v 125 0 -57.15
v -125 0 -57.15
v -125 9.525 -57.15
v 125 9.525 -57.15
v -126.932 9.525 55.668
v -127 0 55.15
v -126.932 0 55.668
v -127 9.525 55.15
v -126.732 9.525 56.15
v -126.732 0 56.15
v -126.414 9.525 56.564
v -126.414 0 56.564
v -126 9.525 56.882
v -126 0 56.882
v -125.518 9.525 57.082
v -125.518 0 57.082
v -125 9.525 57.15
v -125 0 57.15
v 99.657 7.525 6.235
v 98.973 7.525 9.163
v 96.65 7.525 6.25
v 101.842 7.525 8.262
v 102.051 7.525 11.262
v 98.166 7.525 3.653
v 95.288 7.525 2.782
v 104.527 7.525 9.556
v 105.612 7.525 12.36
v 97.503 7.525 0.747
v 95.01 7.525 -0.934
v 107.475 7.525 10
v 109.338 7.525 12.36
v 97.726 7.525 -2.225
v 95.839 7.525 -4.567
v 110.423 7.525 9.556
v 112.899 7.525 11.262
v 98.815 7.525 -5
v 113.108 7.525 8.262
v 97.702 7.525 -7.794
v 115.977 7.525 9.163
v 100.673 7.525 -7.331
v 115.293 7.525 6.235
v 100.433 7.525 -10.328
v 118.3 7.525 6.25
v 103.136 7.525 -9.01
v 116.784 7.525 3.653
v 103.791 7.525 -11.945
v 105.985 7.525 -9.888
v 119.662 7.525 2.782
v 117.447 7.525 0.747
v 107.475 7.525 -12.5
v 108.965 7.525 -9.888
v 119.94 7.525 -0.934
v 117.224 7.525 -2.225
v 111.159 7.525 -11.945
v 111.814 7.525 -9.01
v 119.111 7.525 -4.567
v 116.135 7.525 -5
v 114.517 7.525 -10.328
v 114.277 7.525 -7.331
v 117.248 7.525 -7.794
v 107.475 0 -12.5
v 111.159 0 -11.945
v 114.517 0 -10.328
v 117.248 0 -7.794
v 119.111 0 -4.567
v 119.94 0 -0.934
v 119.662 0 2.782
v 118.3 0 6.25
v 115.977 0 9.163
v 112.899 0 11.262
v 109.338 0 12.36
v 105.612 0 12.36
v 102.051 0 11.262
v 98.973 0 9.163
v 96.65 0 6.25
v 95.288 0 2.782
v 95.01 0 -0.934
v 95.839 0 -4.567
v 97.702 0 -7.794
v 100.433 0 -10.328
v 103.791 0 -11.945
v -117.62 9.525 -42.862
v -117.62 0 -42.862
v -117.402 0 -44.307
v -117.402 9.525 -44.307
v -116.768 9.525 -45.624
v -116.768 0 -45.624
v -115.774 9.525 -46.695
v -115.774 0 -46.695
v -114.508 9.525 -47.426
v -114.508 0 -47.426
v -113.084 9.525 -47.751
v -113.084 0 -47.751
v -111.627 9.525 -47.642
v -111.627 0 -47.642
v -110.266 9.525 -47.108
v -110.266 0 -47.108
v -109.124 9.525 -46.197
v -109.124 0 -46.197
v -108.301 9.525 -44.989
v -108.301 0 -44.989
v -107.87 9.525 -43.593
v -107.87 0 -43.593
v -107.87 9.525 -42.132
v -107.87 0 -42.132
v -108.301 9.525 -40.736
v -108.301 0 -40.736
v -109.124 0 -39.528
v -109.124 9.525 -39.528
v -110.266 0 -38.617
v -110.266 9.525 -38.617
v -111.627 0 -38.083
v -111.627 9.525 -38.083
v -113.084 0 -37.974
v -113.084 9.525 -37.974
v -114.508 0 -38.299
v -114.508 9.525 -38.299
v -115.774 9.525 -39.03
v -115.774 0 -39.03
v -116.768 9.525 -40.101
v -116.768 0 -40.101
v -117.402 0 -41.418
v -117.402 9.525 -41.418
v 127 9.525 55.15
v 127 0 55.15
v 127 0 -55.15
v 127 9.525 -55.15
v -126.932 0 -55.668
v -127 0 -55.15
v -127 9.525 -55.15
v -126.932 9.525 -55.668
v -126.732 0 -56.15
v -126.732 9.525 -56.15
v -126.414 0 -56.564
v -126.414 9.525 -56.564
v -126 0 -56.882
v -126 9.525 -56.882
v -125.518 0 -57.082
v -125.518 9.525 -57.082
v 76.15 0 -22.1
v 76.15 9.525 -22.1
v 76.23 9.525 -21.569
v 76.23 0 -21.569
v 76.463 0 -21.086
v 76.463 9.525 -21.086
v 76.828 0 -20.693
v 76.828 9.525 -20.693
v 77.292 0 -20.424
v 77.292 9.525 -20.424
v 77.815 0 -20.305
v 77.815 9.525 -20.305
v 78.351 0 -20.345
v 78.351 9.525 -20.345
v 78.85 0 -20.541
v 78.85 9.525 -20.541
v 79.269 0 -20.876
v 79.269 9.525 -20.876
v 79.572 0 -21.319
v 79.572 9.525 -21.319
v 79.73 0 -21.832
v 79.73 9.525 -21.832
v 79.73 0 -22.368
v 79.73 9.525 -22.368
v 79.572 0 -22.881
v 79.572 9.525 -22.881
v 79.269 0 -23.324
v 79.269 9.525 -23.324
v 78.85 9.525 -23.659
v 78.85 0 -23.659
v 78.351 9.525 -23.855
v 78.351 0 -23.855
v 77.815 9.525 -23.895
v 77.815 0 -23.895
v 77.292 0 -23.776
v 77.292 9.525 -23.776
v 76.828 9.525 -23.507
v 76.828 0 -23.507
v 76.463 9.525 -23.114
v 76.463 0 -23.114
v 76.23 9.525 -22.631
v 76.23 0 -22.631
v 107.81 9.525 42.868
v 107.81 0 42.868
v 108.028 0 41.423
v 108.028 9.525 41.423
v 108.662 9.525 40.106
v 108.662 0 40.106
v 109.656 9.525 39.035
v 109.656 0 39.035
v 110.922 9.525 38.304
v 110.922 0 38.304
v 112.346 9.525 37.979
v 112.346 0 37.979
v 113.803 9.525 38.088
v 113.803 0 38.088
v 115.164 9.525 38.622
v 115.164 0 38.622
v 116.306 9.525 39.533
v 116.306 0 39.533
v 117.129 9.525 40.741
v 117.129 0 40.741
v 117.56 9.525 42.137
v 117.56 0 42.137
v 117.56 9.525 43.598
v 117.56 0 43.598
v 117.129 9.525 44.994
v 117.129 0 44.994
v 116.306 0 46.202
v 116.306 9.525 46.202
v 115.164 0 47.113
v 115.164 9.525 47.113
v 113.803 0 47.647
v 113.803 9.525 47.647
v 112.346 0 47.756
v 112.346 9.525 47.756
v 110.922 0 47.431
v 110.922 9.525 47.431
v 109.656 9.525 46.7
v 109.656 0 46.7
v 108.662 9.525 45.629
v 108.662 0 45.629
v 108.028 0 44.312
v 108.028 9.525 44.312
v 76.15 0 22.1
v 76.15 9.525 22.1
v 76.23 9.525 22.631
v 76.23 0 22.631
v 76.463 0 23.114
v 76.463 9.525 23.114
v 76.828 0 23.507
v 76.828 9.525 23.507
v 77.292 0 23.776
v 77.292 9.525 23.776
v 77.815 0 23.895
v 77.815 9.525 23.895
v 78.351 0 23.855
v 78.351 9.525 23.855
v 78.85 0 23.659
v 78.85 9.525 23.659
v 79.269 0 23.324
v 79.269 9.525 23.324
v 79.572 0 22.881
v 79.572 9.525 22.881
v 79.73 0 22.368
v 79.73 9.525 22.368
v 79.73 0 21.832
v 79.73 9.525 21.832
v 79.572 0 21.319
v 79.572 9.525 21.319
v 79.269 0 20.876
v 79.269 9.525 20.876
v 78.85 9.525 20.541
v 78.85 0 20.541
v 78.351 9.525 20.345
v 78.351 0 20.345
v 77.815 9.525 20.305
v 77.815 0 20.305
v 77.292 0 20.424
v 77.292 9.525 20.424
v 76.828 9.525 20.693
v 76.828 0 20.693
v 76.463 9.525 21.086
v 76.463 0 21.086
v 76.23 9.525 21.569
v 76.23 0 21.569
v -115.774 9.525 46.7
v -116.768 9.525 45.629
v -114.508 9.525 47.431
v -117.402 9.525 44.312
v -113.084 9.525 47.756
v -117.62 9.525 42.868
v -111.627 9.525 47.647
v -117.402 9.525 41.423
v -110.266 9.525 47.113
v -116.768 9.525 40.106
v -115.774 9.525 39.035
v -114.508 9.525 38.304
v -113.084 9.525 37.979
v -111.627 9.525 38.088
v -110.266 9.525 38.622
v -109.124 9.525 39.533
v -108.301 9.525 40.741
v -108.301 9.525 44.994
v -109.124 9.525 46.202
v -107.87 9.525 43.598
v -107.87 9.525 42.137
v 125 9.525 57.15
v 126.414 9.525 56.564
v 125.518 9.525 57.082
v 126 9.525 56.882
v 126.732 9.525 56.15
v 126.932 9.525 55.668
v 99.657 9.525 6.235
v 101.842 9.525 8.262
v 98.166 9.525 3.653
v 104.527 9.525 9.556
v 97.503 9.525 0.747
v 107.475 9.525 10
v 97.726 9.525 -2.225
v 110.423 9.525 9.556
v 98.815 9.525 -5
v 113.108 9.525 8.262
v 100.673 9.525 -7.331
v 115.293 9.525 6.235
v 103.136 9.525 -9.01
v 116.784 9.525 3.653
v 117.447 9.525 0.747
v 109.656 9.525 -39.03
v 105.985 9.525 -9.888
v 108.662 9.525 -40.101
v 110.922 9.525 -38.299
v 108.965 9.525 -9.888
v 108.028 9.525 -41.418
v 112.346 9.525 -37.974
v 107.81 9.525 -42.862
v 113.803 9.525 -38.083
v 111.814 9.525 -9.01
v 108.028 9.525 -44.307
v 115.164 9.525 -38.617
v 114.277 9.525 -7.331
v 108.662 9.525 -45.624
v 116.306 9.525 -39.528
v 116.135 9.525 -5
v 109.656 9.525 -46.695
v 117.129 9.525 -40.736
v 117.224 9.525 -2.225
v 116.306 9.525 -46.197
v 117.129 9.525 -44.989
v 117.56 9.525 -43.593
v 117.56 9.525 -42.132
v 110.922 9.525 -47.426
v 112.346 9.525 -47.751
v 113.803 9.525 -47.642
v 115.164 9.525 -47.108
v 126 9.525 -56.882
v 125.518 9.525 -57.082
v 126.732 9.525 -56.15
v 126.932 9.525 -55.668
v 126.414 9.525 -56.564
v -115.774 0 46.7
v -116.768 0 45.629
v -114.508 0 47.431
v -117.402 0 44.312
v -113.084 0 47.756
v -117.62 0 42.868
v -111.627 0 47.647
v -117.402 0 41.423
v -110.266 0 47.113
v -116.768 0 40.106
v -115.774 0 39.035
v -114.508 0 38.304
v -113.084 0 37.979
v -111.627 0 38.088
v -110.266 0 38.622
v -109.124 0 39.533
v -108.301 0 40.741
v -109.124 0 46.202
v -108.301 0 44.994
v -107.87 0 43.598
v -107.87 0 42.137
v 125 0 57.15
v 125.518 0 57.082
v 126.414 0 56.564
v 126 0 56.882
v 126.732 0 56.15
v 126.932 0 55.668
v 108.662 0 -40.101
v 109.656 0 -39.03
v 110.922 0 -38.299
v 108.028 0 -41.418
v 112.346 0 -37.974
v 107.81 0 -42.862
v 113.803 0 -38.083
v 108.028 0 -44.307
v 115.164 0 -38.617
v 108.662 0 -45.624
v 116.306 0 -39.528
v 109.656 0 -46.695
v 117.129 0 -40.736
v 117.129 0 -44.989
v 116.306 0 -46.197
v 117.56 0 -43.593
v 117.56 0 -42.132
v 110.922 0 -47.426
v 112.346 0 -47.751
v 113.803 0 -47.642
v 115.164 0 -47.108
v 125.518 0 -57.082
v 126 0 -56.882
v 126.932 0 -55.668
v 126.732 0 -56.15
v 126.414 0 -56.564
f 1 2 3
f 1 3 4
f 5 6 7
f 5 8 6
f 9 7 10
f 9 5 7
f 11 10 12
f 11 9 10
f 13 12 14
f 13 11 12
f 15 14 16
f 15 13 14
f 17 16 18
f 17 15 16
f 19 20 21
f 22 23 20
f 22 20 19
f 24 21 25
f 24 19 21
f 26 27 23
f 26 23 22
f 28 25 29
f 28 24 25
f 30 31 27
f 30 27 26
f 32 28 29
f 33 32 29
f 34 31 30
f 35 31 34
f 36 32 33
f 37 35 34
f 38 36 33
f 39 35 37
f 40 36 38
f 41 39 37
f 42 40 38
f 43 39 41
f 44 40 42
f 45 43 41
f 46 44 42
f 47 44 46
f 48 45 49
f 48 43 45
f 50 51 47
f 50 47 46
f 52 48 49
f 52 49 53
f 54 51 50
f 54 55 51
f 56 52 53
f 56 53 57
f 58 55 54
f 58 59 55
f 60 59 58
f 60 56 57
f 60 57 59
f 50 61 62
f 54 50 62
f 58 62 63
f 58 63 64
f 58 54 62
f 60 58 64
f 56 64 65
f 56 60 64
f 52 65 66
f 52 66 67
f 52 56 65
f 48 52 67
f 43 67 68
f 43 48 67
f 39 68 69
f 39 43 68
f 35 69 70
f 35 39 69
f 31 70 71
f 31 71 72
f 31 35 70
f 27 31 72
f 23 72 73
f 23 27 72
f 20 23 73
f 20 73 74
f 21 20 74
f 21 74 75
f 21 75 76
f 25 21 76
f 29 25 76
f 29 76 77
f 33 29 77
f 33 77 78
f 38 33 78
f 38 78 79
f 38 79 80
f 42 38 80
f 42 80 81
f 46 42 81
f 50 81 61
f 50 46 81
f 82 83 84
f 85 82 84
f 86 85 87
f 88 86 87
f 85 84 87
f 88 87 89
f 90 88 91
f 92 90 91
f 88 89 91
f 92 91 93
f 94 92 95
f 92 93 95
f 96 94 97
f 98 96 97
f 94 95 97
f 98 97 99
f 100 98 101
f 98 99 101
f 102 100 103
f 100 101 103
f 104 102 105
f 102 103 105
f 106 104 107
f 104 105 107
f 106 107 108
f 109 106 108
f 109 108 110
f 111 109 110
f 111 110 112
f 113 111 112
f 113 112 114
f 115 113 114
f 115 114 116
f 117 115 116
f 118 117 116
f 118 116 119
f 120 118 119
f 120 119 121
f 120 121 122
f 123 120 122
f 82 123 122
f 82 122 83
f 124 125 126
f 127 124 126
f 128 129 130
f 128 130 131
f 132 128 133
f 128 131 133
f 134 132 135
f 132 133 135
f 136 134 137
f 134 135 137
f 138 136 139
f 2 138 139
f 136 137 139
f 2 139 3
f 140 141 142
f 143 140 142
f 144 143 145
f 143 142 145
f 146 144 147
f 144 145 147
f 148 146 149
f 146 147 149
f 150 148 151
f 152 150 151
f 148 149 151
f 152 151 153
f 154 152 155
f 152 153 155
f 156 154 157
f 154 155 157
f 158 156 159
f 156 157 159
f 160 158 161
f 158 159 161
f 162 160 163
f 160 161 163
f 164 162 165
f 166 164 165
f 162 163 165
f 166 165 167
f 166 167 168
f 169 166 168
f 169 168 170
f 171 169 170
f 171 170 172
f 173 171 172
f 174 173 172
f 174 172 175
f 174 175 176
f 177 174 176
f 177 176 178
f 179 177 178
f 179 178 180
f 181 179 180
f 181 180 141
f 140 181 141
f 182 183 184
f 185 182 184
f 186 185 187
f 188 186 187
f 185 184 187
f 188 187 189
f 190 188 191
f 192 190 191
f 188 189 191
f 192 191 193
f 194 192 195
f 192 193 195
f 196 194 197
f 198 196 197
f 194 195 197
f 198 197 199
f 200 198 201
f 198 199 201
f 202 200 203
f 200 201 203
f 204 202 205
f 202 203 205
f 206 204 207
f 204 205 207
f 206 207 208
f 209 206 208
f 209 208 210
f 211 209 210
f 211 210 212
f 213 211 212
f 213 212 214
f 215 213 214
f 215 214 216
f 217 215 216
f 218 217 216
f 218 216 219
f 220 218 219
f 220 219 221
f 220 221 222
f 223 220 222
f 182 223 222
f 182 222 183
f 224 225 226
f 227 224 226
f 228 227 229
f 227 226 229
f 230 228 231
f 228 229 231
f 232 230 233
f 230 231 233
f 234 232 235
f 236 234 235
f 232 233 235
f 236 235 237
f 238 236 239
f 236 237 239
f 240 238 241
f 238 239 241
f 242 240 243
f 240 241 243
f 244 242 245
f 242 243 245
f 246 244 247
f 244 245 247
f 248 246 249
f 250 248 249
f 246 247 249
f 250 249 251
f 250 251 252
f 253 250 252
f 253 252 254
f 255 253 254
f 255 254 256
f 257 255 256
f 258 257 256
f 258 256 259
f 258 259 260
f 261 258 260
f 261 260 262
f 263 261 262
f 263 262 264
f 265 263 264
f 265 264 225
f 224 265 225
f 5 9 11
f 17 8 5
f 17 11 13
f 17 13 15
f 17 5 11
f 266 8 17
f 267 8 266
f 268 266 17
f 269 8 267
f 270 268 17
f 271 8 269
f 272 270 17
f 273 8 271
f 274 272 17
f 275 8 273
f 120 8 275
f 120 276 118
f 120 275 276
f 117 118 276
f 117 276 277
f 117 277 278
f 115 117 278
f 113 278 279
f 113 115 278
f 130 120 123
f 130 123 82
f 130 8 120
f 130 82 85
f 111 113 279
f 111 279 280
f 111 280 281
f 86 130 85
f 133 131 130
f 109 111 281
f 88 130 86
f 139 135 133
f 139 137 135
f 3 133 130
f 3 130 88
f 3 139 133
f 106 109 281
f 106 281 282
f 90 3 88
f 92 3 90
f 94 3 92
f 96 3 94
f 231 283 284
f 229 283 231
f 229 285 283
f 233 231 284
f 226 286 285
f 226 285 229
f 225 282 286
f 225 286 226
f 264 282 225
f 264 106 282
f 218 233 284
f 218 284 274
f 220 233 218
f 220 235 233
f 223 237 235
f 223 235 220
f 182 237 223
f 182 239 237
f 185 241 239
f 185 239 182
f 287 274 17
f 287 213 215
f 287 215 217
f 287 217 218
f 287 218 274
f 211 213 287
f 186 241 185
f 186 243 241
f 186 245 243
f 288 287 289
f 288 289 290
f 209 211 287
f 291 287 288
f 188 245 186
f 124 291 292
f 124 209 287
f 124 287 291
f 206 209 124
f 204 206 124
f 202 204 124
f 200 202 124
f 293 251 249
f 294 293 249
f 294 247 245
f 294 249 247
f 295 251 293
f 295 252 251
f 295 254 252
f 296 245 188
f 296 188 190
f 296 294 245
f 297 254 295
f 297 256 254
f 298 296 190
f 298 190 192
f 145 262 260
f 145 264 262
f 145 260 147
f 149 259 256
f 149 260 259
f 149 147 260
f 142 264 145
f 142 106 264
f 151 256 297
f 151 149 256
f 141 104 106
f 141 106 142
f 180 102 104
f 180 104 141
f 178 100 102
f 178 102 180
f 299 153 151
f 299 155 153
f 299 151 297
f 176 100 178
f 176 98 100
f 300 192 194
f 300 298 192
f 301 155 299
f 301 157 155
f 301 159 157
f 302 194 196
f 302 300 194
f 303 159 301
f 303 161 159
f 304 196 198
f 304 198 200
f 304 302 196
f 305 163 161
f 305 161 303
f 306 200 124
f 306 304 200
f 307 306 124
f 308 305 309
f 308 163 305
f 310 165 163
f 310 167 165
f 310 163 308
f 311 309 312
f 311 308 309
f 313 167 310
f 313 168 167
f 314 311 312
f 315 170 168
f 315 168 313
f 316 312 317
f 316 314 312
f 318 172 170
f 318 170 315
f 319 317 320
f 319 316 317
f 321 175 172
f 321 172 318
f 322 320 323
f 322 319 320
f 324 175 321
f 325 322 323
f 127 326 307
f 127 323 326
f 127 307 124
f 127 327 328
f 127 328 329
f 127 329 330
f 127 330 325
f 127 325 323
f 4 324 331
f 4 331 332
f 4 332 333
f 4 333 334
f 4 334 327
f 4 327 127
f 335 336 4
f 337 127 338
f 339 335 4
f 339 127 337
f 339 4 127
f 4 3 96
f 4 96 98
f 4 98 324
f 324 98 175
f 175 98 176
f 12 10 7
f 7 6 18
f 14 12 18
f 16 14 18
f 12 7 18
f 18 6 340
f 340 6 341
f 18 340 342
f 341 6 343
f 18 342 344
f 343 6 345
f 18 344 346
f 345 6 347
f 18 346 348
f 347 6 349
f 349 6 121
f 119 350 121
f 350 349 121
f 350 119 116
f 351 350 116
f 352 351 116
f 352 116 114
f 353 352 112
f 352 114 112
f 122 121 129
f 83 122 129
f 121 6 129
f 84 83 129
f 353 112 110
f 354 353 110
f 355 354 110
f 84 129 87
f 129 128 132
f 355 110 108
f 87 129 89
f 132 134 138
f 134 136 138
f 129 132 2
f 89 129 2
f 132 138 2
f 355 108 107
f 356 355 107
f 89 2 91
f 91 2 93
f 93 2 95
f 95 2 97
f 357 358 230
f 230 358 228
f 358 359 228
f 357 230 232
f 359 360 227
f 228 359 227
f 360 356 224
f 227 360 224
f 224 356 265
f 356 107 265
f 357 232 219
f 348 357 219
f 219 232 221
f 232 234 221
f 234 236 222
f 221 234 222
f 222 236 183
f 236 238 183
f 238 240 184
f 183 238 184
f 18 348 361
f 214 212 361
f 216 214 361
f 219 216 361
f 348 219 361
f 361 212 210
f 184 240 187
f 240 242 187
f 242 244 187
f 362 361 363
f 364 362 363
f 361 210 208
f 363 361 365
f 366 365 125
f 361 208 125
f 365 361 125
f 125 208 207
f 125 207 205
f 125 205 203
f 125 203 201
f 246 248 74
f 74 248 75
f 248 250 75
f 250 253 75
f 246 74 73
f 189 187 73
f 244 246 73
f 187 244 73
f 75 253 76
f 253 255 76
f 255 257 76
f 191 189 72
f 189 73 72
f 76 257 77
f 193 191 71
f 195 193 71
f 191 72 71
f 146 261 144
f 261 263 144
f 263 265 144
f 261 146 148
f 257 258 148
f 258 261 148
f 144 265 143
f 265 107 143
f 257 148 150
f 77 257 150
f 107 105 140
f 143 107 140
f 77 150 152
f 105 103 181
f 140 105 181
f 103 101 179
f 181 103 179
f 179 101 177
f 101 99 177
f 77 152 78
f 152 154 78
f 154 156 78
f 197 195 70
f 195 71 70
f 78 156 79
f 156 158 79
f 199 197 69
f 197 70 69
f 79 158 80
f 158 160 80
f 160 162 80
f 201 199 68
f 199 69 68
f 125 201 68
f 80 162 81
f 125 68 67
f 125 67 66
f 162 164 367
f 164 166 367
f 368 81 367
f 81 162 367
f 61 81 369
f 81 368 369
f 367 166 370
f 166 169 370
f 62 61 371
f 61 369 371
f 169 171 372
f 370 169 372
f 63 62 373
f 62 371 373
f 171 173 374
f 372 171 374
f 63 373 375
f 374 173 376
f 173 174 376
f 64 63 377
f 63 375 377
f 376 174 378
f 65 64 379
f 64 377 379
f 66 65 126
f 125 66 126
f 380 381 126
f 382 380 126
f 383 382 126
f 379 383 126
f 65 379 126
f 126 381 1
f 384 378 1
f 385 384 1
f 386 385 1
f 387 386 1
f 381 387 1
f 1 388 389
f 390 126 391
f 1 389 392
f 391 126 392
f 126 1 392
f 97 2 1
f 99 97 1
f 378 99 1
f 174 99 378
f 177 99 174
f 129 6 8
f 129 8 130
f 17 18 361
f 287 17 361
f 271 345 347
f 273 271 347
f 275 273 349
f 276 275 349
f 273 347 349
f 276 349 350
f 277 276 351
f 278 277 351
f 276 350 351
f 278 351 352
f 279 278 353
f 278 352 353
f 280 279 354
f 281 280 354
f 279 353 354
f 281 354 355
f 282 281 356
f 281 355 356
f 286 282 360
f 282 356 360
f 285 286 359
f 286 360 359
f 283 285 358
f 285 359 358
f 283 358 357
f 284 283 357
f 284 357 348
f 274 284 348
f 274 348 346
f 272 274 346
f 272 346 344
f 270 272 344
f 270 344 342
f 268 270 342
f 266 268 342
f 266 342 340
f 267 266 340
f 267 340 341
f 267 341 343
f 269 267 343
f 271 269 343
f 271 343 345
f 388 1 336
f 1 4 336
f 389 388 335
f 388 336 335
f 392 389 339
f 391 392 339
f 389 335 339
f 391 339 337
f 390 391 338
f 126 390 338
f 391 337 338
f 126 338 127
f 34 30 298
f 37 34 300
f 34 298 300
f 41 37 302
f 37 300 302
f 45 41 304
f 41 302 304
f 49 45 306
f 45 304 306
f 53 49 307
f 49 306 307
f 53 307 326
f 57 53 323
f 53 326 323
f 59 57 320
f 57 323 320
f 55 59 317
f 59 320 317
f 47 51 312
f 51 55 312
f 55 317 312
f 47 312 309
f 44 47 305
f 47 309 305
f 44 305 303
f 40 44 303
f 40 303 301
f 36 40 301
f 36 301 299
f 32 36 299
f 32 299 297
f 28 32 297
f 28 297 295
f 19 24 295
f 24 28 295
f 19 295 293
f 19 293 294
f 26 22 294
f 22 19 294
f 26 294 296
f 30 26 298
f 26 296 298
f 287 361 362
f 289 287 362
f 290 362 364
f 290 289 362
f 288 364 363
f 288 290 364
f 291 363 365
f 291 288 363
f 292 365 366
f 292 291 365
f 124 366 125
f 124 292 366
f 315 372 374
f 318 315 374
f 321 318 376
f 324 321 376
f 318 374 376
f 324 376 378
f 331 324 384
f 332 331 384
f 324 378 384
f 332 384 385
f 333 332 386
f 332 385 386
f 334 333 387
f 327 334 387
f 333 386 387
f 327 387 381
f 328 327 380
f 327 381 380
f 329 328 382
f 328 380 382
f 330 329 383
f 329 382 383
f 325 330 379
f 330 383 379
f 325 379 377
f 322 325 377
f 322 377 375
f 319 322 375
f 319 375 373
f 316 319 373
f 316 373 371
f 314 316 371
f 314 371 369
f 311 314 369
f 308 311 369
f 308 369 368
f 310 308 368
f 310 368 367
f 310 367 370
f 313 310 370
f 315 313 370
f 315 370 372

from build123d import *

# Parameters (mm, degrees)
SKETCH1_W                   = 254
SKETCH1_H                   = 114.3
BOSS_EXTRUDE1_DEPTH         = 9.525
SKETCH2_R                   = 10
CUT_EXTRUDE1_DEPTH          = 140.5917194
F_3_8_CLEARANCE_HOLE1_D     = 9.8044
F_3_8_CLEARANCE_HOLE1_DEPTH = 10
F_3_8_CLEARANCE_HOLE1_TIP   = 2.945538927
FILLET1_R                   = 2
M3_CLEARANCE_HOLE1_D        = 3.6
M3_CLEARANCE_HOLE1_DEPTH    = 10
M3_CLEARANCE_HOLE1_TIP      = 1.081549114
CUT_EXTRUDE2_START          = -7.525
SKETCH11_R                  = 12.5
SKETCH11_R_2                = 10
CUT_EXTRUDE2_DEPTH          = 7.525


with BuildPart() as part:
    # Sketch1 → Boss-Extrude1 (new body)
    with BuildSketch(Plane(origin=(0, 0, 0), x_dir=(1, 0, 0), z_dir=(0, 1, 0))):
        Rectangle(SKETCH1_W, SKETCH1_H)
    extrude(amount=BOSS_EXTRUDE1_DEPTH)

    # Sketch2 → Cut-Extrude1 (cut, through all)
    with BuildSketch(Plane(origin=(0, 9.525, 0), x_dir=(1, 0, 0), z_dir=(0, 1, 0))):
        with Locations(Location((107.475, 0, 0), (0, 0, 270))):
            Circle(SKETCH2_R)
    extrude(amount=-CUT_EXTRUDE1_DEPTH, mode=Mode.SUBTRACT)

    # 3/8 Clearance Hole1
    with Locations(Plane(origin=(0, 9.525, 0), x_dir=(1, 0, 0), z_dir=(0, 1, 0))):
        with Locations((112.7125, 42.8625), (112.7125, -42.8675), (-112.7175, -42.8675), (-112.7175, 42.8625)):
            Hole(F_3_8_CLEARANCE_HOLE1_D / 2, depth=F_3_8_CLEARANCE_HOLE1_DEPTH)
            with Locations((0, 0, -(F_3_8_CLEARANCE_HOLE1_DEPTH + F_3_8_CLEARANCE_HOLE1_TIP / 2))):  # 118° drill point
                Cone(0, F_3_8_CLEARANCE_HOLE1_D / 2, F_3_8_CLEARANCE_HOLE1_TIP, mode=Mode.SUBTRACT)

    # Fillet1
    fillet1_edges = [part.edges().sort_by_distance(p)[0] for p in [
        (127, 4.7625, 57.15),
        (-127, 4.7625, 57.15),
        (-127, 4.7625, -57.15),
        (127, 4.7625, -57.15),
    ]]
    fillet(fillet1_edges, radius=FILLET1_R)

    # M3 Clearance Hole1
    with Locations(Plane.XZ):
        with Locations((77.95, 22.1), (77.95, -22.1)):
            Hole(M3_CLEARANCE_HOLE1_D / 2, depth=M3_CLEARANCE_HOLE1_DEPTH)
            with Locations((0, 0, -(M3_CLEARANCE_HOLE1_DEPTH + M3_CLEARANCE_HOLE1_TIP / 2))):  # 118° drill point
                Cone(0, M3_CLEARANCE_HOLE1_D / 2, M3_CLEARANCE_HOLE1_TIP, mode=Mode.SUBTRACT)

    # Sketch11 → Cut-Extrude2 (cut)
    with BuildSketch(Plane.XZ.offset(CUT_EXTRUDE2_START)):
        with Locations(Location((107.475, 0, 0), (0, 0, 270))):
            Circle(SKETCH11_R)
        with Locations(Location((107.475, 0, 0), (0, 0, 90))):
            Circle(SKETCH11_R_2, mode=Mode.SUBTRACT)
    extrude(amount=CUT_EXTRUDE2_DEPTH, mode=Mode.SUBTRACT)


solid = part.part
